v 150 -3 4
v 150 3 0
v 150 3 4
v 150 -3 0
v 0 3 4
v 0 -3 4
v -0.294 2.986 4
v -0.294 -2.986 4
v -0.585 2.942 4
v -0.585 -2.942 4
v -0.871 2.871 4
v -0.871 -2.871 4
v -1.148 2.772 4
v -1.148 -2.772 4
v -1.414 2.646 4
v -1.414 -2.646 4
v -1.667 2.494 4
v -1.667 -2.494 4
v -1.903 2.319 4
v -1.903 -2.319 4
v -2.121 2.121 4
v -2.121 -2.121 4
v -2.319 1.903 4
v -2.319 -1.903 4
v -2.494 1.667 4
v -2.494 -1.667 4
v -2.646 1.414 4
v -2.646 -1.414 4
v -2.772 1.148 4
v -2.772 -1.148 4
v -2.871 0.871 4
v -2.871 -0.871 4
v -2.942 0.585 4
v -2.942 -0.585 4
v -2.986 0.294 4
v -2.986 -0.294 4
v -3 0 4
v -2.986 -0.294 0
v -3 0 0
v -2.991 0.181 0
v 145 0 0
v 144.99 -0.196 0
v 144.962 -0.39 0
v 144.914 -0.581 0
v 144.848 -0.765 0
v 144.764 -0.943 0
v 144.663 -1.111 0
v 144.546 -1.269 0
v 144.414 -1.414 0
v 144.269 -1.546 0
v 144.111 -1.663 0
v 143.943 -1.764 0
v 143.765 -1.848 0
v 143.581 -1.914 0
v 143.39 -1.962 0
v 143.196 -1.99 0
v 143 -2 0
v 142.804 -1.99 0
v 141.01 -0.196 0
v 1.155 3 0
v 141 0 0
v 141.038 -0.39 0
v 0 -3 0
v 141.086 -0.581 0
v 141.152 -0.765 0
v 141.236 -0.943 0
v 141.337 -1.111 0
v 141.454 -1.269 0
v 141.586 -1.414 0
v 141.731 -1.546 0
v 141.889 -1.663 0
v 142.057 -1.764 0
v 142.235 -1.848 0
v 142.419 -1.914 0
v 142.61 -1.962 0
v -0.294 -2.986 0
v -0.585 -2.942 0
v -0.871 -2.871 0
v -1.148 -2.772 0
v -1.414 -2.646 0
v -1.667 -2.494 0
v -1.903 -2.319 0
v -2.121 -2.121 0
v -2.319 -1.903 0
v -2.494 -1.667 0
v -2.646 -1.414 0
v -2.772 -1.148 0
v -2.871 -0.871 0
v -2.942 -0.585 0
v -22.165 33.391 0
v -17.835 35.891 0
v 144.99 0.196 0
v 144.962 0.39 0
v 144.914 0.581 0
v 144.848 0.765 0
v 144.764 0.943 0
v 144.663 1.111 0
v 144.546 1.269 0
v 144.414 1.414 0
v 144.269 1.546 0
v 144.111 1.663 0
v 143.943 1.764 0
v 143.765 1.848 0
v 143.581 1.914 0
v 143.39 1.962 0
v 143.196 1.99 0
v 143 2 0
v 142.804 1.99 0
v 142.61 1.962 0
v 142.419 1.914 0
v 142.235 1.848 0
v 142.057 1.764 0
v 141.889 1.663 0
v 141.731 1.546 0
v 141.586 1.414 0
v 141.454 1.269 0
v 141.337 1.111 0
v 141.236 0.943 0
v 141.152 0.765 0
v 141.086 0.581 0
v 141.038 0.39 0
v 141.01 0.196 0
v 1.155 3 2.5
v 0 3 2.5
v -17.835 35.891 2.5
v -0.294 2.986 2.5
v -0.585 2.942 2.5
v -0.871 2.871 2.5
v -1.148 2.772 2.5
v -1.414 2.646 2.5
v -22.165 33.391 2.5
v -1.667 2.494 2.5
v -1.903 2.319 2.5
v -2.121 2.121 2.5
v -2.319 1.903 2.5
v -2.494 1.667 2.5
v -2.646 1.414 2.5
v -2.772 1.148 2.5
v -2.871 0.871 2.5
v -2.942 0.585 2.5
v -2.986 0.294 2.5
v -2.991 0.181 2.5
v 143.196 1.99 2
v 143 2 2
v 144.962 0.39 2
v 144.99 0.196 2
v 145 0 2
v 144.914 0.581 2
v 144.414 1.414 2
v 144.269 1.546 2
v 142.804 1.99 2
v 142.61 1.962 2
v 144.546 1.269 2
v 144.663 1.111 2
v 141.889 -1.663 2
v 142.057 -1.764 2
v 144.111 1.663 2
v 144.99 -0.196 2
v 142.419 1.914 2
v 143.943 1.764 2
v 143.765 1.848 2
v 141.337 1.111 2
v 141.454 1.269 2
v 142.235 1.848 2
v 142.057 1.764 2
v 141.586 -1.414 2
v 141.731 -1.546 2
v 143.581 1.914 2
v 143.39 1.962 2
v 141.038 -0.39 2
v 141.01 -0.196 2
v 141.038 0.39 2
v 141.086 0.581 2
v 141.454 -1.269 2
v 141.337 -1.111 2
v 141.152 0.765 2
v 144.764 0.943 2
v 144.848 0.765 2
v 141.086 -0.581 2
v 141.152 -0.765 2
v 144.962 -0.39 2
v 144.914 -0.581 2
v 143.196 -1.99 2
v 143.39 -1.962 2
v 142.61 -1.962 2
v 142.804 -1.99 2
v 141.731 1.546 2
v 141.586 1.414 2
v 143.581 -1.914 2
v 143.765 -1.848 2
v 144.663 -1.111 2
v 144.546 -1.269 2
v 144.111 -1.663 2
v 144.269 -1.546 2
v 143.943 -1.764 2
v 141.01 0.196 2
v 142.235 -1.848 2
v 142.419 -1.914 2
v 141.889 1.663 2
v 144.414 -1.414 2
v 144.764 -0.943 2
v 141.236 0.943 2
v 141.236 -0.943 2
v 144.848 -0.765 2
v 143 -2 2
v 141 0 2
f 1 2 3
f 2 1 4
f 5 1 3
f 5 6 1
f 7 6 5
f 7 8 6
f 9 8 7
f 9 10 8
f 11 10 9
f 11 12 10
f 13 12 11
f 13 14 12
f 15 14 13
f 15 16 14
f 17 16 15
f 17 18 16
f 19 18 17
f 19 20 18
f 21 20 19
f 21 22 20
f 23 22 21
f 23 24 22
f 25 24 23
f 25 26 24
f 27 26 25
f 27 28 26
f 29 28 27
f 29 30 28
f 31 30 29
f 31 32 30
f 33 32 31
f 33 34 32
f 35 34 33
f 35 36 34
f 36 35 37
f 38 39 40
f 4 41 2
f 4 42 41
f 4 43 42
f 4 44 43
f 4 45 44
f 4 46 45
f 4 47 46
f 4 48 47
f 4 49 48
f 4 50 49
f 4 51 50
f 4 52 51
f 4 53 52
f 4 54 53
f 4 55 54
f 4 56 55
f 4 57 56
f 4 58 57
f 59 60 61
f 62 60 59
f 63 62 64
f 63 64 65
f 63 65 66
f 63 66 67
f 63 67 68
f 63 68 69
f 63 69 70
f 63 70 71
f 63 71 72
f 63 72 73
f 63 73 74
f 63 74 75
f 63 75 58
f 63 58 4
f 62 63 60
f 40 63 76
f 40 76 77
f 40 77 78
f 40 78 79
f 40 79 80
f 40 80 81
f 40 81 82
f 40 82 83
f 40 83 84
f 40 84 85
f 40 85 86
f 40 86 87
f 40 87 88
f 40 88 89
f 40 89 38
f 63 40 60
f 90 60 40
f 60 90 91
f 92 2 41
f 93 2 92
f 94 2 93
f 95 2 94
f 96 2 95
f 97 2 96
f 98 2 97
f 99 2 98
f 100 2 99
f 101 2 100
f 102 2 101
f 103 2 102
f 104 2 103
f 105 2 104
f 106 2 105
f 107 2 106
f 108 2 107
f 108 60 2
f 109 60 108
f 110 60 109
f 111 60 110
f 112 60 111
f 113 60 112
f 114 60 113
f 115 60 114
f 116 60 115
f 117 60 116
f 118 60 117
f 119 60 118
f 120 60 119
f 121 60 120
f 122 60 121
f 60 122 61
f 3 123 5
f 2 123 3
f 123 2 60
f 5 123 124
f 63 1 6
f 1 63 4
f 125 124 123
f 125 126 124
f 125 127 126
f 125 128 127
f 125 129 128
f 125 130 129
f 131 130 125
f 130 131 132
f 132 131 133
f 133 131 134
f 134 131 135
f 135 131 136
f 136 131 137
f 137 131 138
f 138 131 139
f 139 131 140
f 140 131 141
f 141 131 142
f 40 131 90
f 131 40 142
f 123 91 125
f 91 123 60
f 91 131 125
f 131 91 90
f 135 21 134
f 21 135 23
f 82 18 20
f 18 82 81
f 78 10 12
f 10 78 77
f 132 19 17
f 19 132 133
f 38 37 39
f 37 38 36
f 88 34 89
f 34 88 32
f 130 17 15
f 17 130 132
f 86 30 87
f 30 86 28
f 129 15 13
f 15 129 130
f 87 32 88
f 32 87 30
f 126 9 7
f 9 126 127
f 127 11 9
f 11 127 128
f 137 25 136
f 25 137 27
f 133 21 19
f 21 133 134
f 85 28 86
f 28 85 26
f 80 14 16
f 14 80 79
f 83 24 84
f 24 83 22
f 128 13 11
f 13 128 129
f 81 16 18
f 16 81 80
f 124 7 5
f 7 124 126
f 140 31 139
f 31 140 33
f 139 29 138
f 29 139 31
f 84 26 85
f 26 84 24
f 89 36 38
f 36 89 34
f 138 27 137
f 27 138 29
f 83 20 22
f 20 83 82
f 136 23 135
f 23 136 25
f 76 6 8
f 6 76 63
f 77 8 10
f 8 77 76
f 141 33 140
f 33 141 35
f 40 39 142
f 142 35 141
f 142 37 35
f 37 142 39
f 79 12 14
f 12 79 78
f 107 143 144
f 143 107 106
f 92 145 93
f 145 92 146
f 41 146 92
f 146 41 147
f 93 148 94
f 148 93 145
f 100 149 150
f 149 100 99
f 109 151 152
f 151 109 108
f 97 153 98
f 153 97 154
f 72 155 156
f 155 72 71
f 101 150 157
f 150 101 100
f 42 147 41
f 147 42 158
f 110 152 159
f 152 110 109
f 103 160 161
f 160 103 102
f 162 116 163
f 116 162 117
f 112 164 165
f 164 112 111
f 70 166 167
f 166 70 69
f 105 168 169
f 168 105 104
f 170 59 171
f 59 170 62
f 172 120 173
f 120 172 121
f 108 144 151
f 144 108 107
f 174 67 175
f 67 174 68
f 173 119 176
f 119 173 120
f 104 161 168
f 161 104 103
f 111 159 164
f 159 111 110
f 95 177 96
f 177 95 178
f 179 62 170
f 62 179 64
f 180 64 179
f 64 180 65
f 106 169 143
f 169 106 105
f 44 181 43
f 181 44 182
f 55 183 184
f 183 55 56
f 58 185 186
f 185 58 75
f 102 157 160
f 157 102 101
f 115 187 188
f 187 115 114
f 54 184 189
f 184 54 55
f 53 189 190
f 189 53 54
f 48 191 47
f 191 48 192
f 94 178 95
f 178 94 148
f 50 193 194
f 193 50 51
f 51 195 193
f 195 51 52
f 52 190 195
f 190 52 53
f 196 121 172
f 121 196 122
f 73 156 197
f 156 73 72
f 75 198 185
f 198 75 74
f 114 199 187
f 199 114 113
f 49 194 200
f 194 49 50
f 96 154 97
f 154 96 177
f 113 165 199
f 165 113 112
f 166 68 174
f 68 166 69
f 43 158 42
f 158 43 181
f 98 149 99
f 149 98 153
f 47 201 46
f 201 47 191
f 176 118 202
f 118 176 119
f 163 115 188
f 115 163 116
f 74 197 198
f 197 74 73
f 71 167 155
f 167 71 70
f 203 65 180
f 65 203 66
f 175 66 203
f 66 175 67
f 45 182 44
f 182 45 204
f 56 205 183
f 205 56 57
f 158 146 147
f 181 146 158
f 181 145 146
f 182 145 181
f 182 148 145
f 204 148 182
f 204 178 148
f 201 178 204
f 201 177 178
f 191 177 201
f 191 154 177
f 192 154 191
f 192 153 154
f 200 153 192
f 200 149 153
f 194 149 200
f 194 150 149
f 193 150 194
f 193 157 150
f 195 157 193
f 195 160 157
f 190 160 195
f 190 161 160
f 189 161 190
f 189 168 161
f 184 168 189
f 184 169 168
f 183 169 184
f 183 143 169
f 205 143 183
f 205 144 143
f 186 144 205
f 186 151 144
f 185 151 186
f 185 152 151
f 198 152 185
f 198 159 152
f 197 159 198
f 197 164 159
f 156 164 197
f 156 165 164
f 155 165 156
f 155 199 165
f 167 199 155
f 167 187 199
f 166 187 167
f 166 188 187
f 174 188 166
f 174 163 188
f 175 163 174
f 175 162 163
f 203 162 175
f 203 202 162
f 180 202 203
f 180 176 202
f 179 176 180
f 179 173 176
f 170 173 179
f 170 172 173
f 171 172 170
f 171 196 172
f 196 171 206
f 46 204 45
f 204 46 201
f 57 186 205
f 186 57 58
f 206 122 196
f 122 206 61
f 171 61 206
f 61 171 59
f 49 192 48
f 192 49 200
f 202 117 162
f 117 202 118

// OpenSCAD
// L-shaped (hockey-stick) cell spreader for bacterial plating.
// Designed for FDM printing, lying flat on the XY plane.

// --- Dimensions ---
handle_l    = 150.0; // Length of the handle
handle_w    = 6.0;   // Width of the handle
handle_t    = 4.0;   // Thickness of the handle
foot_l      = 40.0;  // Length of the spreading foot
foot_w      = 5.0;   // Width of the spreading foot
foot_t      = 2.5;   // Thickness of the spreading foot
boss_d      = 6.0;   // Diameter of the joining boss
boss_h      = 4.0;   // Height of the joining boss
hole_d      = 4.0;   // Diameter of the hanging hole
angle_deg   = 120.0; // Angle between handle and foot (counter-clockwise from +X)

$fn = 64;

// --- Geometry Calculations ---
// The handle is centered on Y, so its Y range is [-handle_w/2, handle_w/2]
// The foot is rotated 120 degrees.

module spreader() {
    difference() {
        union() {
            // 1. The Handle
            // Centered on Y, extends from X=0 to X=handle_l
            translate([handle_l / 2, 0, 0])
                cube([handle_l, handle_w, handle_t], center = true);
            
            // Note: The user specified x=0 to 150, y=-3 to 3, z=0 to 4.
            // To keep it centered on origin for easier modeling, 
            // I will use the user's coordinate logic but translate to Z=0.
            // Let's build it using the user's specific coordinate request:
            
            // Handle: x [0, 150], y [-3, 3], z [0, 4]
            // To make it sit at Z=0, we use the user's dimensions.
            // We'll use a union of the handle, the foot, and the boss.
            
            // Handle
            translate([handle_l / 2, 0, handle_t / 2])
                cube([handle_l, handle_w, handle_t], center = true);

            // 2. The Spreading Foot
            // Center line starts at origin, 120 deg from +X.
            // Foot length is 40, width 5, thickness 2.5.
            // We rotate the foot around the Z axis.
            // Since the foot is a bar, we create it centered and then rotate.
            rotate([0, 0, angle_deg])
            translate([foot_l / 2, 0, foot_t / 2])
                cube([foot_l, foot_w, foot_t], center = true);

            // 3. The Boss
            // 6mm diameter, 4mm tall at the origin.
            // To ensure it joins the bars, we place it at the origin.
            translate([0, 0, boss_h / 2])
                cylinder(d = boss_d, h = boss_h, center = true);
        }

        // 4. The Hanging Hole
        // 4mm diameter through the handle at x = 143, y = 0.
        // We extend the cylinder in Z to ensure a clean cut.
        translate([143, 0, -1])
            cylinder(d = hole_d, h = handle_t + 2, center = true);
    }
}

// Execute the module
// We translate the whole assembly so the bottom of the handle is at Z=0
// The user requested z=0 to 4 for the handle, so we don't need a global Z offset.
// However, the foot is z=0 to 2.5. To ensure the whole part sits on Z=0:
// We'll build the parts such that their minimum Z is 0.

module final_spreader() {
    difference() {
        union() {
            // Handle: x [0, 150], y [-3, 3], z [0, 4]
            translate([handle_l/2, 0, handle_t/2])
                cube([handle_l, handle_w, handle_t], center = true);
            
            // Foot: 40 long, 5 wide, 2.5 thick. 
            // Center line starts at origin, points 120 deg from +X.
            // We rotate the foot around the origin.
            rotate([0, 0, angle_deg])
            translate([foot_l/2, 0, foot_t/2])
                cube([foot_l, foot_w, foot_t], center = true);
            
            // Boss: 6 dia, 4 tall at origin.
            // To bridge the handle (z=0 to 4) and foot (z=0 to 2.5), 
            // we place the boss at the origin.
            translate([0, 0, boss_h/2])
                cylinder(d = boss_d, h = boss_h, center = true);
        }
        
        // Hole: x=143, y=0, through handle
        translate([143, 0, -1])
            cylinder(d = hole_d, h = handle_t + 2, center = true);
    }
}

final_spreader();
